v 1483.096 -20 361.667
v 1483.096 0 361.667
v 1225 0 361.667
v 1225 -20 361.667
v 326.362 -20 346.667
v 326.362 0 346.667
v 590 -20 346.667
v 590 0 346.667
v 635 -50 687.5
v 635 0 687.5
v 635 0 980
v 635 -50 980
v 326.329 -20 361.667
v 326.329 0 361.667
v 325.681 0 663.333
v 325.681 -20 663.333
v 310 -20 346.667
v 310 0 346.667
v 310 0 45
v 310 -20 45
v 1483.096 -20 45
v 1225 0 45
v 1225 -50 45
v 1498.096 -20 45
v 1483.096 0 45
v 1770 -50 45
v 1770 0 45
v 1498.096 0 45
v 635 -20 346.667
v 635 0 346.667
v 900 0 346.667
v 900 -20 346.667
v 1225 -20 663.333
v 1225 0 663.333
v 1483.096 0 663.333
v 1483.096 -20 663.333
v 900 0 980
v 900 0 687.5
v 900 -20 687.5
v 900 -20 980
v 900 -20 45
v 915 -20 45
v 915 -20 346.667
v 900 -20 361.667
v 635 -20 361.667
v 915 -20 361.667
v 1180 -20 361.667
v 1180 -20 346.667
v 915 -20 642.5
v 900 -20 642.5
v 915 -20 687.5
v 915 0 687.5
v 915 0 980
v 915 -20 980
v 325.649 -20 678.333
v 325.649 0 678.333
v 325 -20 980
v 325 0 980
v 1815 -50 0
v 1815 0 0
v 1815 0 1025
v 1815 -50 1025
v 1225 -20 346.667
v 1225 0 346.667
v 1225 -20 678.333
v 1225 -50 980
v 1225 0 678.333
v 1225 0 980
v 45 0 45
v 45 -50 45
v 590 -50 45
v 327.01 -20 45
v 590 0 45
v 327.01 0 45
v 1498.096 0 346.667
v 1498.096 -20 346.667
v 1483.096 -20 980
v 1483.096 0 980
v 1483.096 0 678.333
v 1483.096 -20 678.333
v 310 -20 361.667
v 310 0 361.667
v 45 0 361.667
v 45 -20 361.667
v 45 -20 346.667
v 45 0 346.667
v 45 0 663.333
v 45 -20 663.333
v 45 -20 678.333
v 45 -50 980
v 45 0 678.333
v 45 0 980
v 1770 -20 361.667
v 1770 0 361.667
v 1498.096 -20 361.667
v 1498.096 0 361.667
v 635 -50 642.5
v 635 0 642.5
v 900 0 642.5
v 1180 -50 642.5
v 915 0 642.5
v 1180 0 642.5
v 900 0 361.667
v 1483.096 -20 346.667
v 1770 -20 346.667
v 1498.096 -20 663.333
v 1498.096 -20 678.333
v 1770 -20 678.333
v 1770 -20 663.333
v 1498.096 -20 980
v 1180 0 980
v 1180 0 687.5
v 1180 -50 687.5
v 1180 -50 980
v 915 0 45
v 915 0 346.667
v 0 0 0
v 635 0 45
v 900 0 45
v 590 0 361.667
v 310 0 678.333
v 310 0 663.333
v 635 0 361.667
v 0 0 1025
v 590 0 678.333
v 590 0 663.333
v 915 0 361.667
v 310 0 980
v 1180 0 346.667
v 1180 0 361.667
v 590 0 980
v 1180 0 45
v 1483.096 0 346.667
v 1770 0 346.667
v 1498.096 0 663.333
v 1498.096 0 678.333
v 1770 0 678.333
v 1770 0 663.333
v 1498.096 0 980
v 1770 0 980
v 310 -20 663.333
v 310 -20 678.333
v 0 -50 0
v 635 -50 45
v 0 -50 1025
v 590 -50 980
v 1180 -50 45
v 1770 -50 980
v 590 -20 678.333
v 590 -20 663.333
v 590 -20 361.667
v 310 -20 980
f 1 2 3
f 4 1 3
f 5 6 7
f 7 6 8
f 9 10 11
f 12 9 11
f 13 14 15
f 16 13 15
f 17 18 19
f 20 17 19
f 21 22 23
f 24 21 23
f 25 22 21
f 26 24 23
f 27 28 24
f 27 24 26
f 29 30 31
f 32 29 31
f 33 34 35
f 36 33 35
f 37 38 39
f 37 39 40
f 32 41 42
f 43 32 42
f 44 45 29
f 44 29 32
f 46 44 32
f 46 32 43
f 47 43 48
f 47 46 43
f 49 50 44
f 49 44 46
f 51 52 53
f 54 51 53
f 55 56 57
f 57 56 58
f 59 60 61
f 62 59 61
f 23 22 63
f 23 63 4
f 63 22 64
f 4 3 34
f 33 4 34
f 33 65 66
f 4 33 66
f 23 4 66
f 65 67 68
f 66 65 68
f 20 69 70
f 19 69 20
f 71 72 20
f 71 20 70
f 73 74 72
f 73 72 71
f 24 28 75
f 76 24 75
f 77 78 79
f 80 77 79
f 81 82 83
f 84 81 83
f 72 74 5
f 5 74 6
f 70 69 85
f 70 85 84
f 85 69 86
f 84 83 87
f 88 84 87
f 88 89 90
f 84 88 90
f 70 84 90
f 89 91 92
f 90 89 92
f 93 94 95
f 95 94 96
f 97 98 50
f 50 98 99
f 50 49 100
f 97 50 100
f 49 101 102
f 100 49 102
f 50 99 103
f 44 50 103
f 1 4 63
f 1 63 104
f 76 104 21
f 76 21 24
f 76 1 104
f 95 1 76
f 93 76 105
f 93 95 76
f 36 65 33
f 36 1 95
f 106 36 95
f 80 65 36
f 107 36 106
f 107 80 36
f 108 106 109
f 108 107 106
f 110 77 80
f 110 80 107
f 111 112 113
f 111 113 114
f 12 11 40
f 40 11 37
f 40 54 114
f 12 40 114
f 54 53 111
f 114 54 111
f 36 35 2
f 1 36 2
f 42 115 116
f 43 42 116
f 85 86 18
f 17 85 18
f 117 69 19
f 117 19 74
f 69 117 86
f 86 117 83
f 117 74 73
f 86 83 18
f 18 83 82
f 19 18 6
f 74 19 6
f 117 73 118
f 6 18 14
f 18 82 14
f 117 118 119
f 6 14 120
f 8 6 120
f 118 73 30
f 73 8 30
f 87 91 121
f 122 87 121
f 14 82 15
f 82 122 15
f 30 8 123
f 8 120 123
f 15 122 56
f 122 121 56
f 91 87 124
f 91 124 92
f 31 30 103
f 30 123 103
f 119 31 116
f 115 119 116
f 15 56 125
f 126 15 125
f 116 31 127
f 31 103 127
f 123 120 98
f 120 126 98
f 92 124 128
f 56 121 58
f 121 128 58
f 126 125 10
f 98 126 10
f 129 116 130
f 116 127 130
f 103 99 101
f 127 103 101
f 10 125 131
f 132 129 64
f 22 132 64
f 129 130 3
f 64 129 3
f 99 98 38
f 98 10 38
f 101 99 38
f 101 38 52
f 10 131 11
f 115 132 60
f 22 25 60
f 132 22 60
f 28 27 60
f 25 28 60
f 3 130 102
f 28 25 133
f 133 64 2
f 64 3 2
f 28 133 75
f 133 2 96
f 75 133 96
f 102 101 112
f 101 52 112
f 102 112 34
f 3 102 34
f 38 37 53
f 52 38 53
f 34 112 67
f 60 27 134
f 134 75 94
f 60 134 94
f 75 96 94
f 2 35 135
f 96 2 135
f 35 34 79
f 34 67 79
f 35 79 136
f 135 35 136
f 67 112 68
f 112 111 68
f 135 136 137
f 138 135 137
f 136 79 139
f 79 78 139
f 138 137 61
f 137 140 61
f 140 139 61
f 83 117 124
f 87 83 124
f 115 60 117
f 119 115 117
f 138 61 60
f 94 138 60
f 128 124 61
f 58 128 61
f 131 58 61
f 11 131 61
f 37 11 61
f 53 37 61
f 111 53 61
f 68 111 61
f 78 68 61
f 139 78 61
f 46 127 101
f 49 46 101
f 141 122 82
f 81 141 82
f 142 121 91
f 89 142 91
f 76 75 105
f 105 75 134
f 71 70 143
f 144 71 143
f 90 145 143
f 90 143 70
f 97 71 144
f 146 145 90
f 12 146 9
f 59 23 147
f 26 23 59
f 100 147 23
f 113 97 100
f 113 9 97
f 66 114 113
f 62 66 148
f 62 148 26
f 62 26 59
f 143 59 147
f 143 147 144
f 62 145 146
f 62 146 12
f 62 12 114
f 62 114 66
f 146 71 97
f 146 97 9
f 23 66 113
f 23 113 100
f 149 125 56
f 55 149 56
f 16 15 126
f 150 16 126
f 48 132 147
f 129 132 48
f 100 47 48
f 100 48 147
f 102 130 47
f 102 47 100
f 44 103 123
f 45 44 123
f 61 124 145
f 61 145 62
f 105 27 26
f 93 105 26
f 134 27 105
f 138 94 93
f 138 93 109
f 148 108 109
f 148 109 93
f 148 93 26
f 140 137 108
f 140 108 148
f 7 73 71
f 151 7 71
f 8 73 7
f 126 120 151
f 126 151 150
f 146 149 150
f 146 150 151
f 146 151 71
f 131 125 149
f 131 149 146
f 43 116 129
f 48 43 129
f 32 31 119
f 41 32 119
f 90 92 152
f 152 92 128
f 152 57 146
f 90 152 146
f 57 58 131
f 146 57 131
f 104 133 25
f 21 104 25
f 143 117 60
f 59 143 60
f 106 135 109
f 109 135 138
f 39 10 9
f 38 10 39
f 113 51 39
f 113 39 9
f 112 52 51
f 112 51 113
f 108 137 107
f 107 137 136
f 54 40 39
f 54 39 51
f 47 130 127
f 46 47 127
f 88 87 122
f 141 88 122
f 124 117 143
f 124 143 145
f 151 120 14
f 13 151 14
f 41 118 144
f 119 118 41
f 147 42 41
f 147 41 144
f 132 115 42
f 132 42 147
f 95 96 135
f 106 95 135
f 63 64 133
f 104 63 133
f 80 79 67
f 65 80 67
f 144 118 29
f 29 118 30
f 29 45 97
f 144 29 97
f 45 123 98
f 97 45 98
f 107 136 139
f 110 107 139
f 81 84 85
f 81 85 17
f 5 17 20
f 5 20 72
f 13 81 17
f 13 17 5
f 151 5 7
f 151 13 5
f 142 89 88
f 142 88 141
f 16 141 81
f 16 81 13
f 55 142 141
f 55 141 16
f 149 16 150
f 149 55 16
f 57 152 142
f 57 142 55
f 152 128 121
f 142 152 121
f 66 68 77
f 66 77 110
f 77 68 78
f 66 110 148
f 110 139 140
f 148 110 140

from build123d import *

# Parameters (mm, degrees)
F0_W     = 1815
F0_H     = 1025
F0_W_2   = 545
F0_H_2   = 597.5
F0_H_3   = 935
F0_H_4   = 292.5
F1_DEPTH = 50
F2_W     = 15
F2_H     = 292.5
F3_DEPTH = 20


with BuildPart() as f1:
    # F0 (on Front) → F1 (new body)
    with BuildSketch(Plane.XZ):
        with Locations((907.5, 512.5)):
            Rectangle(F0_W, F0_H)
        with Locations((907.5, 343.75)):
            Rectangle(F0_W_2, F0_H_2, mode=Mode.SUBTRACT)
        with Locations((317.5, 512.5)):
            Rectangle(F0_W_2, F0_H_3, mode=Mode.SUBTRACT)
        with Locations((907.5, 833.75)):
            Rectangle(F0_W_2, F0_H_4, mode=Mode.SUBTRACT)
        with Locations((1497.5, 512.5)):
            Rectangle(F0_W_2, F0_H_3, mode=Mode.SUBTRACT)
    extrude(amount=F1_DEPTH)

    # F2 (on Front) → F3 (join)
    with BuildSketch(Plane.XZ):
        Polygon((325, 980), (310, 980), (310, 678.333333), (45, 678.333333), (45, 663.333333), (310, 663.333333), (310, 361.666667), (45, 361.666667), (45, 346.666667), (310, 346.666667), (310, 45), (327.010195, 45), (326.36163, 346.666667), (590, 346.666667), (590, 361.666667), (326.329381, 361.666667), (325.680815, 663.333333), (590, 663.333333), (590, 678.333333), (325.648566, 678.333333), align=None)
        Polygon((1498.095772, 980), (1483.095772, 980), (1483.095772, 678.333333), (1225, 678.333333), (1225, 663.333333), (1483.095772, 663.333333), (1483.095772, 361.666667), (1225, 361.666667), (1225, 346.666667), (1483.095772, 346.666667), (1483.095772, 45), (1498.095772, 45), (1498.095772, 346.666667), (1770, 346.666667), (1770, 361.666667), (1498.095772, 361.666667), (1498.095772, 663.333333), (1770, 663.333333), (1770, 678.333333), (1498.095772, 678.333333), align=None)
        with Locations((907.5, 833.75)):
            Rectangle(F2_W, F2_H)
        Polygon((915, 642.5), (900, 642.5), (900, 361.666667), (635, 361.666667), (635, 346.666667), (900, 346.666667), (900, 45), (915, 45), (915, 346.666667), (1180, 346.666667), (1180, 361.666667), (915, 361.666667), align=None)
    extrude(amount=F3_DEPTH)


solid = f1.part
